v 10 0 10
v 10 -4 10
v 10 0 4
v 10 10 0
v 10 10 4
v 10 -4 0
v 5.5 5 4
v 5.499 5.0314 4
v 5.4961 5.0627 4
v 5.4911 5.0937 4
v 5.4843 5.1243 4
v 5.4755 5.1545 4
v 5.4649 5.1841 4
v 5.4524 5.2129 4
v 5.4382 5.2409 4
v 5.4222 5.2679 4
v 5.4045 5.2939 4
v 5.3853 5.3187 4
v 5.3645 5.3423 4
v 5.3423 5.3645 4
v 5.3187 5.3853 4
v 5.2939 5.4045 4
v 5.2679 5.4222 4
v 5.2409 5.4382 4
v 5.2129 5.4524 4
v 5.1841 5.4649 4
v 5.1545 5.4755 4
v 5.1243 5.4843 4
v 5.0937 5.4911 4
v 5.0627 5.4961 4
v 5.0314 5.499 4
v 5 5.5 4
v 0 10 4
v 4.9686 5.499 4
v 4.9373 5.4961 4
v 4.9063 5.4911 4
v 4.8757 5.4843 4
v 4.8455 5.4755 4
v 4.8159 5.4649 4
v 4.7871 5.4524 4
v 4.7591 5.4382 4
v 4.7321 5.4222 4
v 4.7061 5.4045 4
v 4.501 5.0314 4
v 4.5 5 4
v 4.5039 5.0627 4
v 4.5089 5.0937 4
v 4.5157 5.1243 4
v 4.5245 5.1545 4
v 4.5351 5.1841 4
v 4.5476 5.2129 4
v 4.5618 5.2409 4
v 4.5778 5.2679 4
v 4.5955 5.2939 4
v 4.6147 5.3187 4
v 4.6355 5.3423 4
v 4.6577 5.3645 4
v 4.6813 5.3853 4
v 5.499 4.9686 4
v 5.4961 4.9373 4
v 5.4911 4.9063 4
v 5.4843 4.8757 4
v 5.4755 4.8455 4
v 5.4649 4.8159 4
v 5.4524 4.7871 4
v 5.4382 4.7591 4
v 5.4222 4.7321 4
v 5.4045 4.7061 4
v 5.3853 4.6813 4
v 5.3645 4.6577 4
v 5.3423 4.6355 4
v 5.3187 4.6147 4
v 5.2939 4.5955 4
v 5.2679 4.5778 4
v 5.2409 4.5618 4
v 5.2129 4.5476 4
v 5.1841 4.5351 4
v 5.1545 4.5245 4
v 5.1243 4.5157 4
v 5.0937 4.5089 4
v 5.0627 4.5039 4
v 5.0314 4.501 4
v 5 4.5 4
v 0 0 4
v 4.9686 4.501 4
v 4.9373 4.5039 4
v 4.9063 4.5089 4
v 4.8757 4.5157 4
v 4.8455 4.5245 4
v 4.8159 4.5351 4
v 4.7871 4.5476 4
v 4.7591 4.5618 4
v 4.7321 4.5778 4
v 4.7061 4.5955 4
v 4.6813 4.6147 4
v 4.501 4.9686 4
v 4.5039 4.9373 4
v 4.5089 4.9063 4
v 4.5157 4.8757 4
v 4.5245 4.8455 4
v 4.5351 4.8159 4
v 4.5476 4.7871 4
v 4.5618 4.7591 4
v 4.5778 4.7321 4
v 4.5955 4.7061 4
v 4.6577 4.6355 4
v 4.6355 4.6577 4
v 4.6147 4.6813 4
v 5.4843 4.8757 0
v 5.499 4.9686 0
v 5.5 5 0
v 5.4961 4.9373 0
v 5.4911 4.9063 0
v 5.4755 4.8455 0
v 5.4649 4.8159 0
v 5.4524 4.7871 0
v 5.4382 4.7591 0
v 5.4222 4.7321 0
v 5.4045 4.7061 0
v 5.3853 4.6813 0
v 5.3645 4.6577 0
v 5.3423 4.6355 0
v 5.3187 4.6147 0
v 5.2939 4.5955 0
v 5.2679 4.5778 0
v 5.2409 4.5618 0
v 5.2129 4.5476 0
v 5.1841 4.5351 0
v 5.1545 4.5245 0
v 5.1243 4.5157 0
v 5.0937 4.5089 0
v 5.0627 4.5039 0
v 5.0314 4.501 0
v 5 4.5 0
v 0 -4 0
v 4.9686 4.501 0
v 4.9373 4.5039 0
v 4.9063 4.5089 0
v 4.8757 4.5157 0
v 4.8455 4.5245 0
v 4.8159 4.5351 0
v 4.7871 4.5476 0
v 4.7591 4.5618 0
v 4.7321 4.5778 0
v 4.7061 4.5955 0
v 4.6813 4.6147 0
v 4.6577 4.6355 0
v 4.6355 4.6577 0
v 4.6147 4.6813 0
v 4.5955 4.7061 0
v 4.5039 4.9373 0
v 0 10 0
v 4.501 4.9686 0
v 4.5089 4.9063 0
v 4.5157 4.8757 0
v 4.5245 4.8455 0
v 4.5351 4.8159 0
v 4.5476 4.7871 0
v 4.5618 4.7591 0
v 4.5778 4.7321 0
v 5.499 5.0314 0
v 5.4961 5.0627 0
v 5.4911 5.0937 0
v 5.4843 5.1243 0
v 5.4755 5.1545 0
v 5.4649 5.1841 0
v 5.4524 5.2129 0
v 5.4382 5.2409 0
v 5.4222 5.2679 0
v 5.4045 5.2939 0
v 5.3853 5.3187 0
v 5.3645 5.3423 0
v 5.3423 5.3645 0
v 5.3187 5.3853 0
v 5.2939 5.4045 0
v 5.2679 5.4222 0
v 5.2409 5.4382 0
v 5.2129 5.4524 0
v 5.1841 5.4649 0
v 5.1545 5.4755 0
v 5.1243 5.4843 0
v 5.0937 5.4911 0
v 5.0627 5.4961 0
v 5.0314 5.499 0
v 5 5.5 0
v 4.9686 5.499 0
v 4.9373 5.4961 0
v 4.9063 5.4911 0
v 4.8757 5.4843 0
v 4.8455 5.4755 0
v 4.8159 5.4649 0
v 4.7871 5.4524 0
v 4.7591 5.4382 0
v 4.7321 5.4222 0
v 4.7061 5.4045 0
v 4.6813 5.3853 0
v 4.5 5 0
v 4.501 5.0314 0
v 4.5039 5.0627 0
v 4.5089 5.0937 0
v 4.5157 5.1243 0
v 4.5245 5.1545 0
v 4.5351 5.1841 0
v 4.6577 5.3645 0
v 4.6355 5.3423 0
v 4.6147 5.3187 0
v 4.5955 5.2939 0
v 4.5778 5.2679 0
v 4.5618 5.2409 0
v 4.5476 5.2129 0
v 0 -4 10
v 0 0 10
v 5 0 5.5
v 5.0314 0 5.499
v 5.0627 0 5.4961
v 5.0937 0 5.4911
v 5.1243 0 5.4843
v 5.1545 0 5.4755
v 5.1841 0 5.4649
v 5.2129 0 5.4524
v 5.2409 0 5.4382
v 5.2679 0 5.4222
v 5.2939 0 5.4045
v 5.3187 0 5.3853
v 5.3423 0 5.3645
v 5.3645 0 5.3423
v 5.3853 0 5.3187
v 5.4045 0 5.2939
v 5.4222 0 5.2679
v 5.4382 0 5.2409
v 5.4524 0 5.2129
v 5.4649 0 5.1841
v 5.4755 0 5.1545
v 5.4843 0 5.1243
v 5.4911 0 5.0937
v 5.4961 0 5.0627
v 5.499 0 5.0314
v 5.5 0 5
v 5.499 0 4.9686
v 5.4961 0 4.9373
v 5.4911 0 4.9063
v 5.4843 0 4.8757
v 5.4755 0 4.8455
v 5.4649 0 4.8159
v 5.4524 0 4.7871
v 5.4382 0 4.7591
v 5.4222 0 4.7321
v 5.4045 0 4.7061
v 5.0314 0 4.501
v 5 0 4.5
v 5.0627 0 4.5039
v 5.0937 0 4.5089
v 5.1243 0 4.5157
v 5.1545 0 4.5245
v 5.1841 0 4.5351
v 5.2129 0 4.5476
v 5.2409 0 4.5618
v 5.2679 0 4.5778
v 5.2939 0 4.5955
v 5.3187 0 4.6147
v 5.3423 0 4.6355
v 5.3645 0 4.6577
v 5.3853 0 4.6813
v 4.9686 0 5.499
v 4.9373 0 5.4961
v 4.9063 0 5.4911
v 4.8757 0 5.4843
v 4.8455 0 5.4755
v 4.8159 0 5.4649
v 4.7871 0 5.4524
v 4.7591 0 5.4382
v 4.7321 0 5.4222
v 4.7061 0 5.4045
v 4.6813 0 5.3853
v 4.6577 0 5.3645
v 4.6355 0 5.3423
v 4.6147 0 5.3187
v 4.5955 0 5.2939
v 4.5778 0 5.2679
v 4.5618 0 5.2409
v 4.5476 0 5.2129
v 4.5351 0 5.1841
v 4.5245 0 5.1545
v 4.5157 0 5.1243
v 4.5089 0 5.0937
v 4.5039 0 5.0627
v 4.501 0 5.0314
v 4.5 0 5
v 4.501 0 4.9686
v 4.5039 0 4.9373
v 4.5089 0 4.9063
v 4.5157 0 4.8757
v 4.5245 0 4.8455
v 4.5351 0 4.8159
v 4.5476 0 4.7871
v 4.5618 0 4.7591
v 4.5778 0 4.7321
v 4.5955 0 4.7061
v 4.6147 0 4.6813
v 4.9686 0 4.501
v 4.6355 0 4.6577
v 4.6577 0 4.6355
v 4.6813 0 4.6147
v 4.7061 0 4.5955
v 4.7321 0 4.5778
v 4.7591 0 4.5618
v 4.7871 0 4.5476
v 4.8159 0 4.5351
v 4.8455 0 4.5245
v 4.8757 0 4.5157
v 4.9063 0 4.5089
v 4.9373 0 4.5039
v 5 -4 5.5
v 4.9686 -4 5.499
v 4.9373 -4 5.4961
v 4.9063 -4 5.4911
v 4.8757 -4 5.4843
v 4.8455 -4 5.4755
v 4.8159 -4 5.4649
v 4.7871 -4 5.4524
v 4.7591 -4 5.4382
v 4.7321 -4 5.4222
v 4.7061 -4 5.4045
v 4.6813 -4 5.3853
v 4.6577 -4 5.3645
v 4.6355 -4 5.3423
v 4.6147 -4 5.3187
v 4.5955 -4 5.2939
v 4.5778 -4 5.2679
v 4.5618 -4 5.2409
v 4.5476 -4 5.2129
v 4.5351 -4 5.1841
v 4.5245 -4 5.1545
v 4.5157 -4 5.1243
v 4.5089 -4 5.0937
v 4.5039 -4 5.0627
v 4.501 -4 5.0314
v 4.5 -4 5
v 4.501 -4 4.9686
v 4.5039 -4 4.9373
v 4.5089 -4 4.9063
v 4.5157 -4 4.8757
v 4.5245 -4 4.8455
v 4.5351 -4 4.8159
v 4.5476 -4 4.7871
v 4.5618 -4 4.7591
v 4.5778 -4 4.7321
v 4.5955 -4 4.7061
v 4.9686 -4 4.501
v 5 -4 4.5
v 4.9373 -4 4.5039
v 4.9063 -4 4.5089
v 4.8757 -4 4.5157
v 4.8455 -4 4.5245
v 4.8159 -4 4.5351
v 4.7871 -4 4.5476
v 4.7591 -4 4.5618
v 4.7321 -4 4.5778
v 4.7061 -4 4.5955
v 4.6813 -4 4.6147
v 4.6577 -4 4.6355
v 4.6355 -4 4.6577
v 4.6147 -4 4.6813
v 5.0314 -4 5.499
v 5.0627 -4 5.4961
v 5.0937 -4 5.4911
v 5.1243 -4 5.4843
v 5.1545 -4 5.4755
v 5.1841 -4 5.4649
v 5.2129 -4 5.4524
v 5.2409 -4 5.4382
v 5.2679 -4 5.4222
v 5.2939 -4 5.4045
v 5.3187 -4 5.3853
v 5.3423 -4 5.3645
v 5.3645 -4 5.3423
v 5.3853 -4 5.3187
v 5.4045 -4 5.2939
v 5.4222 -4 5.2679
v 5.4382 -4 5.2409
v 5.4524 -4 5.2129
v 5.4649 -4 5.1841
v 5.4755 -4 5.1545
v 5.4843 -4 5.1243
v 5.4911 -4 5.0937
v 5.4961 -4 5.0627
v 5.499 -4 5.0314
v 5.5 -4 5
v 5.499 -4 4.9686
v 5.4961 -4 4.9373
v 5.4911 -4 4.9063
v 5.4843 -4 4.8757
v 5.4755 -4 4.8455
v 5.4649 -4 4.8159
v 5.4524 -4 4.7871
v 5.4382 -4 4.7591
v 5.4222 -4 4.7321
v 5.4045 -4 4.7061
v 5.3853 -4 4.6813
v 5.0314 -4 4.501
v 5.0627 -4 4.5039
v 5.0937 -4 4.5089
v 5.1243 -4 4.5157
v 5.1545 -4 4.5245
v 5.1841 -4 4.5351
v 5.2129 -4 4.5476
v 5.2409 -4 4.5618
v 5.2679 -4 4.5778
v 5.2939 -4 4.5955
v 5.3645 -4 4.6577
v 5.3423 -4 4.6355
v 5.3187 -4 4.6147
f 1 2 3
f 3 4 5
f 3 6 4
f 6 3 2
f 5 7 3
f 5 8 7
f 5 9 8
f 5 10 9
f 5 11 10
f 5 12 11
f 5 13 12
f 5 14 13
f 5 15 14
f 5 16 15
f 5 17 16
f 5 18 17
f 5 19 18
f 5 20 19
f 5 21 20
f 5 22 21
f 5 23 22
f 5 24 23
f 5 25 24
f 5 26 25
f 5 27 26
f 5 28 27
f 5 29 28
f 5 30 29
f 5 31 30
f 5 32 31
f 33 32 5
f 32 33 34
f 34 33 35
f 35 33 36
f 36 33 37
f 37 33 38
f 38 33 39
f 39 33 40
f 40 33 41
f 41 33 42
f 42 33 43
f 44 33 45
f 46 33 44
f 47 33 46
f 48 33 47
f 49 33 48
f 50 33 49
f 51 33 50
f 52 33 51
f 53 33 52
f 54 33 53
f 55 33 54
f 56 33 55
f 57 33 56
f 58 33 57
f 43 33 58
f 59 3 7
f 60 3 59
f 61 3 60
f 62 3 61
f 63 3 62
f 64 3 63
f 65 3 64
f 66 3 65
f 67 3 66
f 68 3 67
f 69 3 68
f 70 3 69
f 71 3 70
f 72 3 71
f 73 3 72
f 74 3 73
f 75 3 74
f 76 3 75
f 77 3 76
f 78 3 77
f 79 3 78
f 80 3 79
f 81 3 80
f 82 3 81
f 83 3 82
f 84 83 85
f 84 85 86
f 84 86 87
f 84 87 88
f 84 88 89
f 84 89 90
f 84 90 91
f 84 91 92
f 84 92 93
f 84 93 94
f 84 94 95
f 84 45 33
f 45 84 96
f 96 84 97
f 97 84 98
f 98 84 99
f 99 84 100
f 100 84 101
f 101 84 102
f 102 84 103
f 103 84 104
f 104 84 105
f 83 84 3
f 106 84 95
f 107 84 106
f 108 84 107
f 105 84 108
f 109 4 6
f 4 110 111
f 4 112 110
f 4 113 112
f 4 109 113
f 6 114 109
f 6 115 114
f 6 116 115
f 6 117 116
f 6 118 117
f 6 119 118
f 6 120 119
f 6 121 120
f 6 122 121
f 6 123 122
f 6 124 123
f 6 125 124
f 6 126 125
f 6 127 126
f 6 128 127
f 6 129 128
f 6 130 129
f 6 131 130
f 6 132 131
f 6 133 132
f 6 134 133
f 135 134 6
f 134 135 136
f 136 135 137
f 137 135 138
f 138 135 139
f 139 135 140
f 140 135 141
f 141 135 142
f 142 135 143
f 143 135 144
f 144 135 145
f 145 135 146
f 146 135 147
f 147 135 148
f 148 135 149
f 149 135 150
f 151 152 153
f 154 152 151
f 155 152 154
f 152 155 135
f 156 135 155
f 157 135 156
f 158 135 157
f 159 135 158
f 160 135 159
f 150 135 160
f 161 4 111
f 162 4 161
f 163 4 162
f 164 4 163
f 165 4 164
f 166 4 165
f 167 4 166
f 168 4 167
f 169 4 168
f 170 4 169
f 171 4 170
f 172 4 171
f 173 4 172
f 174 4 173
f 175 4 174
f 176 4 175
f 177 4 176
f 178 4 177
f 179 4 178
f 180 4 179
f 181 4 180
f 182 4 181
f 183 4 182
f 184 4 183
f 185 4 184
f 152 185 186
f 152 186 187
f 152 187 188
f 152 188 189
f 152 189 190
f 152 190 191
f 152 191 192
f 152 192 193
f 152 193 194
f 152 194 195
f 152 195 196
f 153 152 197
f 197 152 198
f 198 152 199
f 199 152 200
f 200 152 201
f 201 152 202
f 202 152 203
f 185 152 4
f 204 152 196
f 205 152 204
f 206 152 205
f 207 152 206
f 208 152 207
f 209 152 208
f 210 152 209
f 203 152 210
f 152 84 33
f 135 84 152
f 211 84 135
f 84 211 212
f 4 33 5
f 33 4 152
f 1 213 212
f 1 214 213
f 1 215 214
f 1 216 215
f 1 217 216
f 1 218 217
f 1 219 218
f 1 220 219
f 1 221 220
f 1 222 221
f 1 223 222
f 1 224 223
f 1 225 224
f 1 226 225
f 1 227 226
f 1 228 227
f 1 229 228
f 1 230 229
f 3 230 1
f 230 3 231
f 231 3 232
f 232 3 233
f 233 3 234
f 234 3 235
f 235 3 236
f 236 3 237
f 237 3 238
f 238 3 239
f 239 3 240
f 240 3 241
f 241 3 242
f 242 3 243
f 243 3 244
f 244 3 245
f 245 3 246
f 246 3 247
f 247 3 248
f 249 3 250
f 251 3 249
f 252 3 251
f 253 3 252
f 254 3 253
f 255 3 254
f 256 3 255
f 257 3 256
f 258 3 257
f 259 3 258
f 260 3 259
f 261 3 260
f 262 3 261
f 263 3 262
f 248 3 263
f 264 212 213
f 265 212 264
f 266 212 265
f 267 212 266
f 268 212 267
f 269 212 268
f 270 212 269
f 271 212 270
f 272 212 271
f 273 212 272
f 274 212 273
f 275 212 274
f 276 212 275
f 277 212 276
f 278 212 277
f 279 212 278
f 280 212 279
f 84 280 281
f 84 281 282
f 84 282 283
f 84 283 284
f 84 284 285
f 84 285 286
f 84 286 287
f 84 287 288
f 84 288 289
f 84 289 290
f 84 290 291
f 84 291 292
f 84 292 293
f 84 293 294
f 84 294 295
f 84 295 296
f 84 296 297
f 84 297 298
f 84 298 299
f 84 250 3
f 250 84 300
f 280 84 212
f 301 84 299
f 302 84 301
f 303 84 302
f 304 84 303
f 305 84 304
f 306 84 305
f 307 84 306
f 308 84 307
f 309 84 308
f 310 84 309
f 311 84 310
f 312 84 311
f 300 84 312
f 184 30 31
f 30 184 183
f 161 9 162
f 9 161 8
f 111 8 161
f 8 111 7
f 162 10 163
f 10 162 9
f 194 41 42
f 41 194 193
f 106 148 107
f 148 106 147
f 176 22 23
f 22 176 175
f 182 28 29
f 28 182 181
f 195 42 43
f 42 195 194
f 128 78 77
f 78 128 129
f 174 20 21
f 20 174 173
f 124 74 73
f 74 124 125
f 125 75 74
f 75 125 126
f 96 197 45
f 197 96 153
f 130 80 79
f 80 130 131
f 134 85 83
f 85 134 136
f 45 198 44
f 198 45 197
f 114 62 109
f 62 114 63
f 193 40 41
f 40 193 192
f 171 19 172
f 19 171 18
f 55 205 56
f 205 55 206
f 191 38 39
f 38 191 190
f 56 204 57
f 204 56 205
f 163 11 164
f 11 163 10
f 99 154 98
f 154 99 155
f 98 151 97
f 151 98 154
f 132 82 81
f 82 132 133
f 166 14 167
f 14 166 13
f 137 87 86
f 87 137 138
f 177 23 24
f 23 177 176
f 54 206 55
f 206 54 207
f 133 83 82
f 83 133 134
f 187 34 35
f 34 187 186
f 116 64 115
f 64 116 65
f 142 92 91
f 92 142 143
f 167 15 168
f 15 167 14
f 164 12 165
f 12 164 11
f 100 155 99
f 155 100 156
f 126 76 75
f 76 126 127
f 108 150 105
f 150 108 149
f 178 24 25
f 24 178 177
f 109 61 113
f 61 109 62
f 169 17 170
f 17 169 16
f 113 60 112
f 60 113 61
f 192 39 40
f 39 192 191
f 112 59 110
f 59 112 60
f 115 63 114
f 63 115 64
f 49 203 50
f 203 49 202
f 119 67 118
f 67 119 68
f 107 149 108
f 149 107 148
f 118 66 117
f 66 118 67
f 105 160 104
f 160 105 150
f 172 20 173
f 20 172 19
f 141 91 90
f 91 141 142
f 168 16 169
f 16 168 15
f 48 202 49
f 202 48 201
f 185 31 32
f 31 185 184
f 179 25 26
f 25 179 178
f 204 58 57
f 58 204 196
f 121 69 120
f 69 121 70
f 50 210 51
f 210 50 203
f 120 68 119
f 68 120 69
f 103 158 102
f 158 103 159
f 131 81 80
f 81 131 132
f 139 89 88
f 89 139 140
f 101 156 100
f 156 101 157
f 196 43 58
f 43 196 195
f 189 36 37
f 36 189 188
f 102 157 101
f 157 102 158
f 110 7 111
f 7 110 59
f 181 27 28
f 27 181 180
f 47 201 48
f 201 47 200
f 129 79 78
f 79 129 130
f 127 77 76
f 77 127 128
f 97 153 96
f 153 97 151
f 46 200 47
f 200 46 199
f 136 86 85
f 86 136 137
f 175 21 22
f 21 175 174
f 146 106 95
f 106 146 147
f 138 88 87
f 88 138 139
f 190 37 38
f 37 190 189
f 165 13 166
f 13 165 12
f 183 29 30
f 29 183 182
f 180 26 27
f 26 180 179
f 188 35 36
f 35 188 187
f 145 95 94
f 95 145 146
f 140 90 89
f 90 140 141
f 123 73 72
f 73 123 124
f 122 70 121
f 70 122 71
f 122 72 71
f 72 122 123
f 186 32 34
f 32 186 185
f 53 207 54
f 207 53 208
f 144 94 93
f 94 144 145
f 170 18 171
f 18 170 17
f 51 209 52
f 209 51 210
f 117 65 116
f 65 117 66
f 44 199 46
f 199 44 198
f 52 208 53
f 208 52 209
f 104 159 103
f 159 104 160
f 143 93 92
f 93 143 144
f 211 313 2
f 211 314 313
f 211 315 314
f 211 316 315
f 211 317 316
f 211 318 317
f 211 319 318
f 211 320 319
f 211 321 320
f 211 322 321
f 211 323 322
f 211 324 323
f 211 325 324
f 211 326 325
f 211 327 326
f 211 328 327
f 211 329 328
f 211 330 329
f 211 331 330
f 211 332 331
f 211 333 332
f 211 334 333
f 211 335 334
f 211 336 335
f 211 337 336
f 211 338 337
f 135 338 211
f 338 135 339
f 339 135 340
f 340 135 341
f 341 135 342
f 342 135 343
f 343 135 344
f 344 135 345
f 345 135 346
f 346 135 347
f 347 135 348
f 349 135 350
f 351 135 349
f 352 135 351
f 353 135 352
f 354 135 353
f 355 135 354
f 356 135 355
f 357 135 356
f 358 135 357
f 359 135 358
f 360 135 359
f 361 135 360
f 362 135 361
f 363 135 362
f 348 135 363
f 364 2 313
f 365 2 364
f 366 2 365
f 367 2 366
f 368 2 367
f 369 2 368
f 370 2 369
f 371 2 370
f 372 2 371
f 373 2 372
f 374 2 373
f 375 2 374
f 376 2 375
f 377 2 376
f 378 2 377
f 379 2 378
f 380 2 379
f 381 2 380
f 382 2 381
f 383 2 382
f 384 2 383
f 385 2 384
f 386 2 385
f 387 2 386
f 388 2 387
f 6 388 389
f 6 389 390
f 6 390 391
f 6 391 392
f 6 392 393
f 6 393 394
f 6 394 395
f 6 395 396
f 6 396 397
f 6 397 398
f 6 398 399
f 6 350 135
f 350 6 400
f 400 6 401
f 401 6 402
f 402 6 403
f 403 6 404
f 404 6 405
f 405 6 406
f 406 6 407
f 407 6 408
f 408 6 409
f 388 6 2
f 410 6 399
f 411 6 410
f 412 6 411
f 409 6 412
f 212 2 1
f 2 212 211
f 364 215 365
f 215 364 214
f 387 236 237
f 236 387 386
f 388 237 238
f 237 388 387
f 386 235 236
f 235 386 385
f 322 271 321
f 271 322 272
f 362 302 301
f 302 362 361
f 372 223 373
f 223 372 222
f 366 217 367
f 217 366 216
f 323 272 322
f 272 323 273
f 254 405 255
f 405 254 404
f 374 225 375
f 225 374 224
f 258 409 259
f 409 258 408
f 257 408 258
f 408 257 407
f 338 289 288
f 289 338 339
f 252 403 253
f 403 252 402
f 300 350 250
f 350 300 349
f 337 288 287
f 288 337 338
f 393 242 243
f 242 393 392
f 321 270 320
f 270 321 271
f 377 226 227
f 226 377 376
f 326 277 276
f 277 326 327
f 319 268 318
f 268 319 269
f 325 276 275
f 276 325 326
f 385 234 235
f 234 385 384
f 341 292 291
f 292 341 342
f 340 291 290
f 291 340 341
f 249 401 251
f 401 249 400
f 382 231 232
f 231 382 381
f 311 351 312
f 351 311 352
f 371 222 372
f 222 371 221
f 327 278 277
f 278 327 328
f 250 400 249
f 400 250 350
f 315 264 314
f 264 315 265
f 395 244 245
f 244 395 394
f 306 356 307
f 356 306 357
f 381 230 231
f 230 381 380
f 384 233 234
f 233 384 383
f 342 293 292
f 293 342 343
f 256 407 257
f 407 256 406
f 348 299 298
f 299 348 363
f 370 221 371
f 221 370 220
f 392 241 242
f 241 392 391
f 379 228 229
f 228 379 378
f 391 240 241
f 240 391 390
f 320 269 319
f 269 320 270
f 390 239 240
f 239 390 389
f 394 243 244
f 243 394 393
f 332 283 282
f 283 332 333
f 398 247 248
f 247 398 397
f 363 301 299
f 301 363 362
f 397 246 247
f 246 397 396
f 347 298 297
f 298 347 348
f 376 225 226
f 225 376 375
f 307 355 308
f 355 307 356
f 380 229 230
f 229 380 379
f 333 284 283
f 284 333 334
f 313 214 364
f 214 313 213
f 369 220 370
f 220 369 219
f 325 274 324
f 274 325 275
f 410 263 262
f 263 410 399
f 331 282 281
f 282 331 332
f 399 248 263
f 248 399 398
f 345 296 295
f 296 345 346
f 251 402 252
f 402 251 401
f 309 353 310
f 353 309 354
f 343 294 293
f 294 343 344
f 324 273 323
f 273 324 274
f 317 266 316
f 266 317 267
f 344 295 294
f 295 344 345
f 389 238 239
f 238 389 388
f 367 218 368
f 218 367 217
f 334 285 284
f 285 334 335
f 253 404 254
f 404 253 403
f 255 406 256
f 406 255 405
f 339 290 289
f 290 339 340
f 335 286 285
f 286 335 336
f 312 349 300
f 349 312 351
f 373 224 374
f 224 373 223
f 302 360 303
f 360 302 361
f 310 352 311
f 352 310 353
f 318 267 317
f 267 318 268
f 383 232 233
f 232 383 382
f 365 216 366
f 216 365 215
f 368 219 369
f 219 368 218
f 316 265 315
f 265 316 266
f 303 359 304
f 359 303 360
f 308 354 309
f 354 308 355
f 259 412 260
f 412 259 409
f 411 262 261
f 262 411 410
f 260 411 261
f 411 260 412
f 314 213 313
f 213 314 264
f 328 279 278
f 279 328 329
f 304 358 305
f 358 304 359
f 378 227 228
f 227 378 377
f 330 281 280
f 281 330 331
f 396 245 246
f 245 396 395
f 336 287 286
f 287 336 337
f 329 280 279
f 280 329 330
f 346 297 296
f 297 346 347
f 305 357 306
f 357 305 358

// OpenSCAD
$fn=30;
/*
scale([1,1,5]){
    cube([1,1,1/5], center=true);
}


union(){
    cube([5,5,1]); 
    cylinder(r=1,h=1);
}

intersection(){
    cube([5,5,1]); 
    cylinder(r=1,h=1);
}
difference(){
    cube([5,5,1]); 
    cylinder(r=1,h=1);
}

cube([5,5,1]);
translate([2.5,2.5,-0.5]){
    cylinder(r=1,h=2);
}



module plate(){
difference(){
cube([5,5,1]);
translate([2.5,2.5,-0.5]){
    cylinder(r=1,h=2);
}
}
}
rotate(a=0,v=[1,0,0])translate([-2.5,-2.5,-0.5]) plate();



module plate(l,w,t){
difference(){
cube([l,w,t]);
translate([l/2,w/2,0]){
    cylinder(r=0.5,h=t, $fn=100);
}
}
}
plate(10,10,2);

*/


module plate(l,w,t){
difference(){
cube([l,w,t]);
translate([l/2,w/2,0]){
    cylinder(r=0.5,h=t, $fn=100);
}
}
}

module bracket(l,w,t){
    rotate(a=90,v=[1,0,0])plate(l,w,t);
    plate(l,w,t);
}

bracket(10,10,4);
